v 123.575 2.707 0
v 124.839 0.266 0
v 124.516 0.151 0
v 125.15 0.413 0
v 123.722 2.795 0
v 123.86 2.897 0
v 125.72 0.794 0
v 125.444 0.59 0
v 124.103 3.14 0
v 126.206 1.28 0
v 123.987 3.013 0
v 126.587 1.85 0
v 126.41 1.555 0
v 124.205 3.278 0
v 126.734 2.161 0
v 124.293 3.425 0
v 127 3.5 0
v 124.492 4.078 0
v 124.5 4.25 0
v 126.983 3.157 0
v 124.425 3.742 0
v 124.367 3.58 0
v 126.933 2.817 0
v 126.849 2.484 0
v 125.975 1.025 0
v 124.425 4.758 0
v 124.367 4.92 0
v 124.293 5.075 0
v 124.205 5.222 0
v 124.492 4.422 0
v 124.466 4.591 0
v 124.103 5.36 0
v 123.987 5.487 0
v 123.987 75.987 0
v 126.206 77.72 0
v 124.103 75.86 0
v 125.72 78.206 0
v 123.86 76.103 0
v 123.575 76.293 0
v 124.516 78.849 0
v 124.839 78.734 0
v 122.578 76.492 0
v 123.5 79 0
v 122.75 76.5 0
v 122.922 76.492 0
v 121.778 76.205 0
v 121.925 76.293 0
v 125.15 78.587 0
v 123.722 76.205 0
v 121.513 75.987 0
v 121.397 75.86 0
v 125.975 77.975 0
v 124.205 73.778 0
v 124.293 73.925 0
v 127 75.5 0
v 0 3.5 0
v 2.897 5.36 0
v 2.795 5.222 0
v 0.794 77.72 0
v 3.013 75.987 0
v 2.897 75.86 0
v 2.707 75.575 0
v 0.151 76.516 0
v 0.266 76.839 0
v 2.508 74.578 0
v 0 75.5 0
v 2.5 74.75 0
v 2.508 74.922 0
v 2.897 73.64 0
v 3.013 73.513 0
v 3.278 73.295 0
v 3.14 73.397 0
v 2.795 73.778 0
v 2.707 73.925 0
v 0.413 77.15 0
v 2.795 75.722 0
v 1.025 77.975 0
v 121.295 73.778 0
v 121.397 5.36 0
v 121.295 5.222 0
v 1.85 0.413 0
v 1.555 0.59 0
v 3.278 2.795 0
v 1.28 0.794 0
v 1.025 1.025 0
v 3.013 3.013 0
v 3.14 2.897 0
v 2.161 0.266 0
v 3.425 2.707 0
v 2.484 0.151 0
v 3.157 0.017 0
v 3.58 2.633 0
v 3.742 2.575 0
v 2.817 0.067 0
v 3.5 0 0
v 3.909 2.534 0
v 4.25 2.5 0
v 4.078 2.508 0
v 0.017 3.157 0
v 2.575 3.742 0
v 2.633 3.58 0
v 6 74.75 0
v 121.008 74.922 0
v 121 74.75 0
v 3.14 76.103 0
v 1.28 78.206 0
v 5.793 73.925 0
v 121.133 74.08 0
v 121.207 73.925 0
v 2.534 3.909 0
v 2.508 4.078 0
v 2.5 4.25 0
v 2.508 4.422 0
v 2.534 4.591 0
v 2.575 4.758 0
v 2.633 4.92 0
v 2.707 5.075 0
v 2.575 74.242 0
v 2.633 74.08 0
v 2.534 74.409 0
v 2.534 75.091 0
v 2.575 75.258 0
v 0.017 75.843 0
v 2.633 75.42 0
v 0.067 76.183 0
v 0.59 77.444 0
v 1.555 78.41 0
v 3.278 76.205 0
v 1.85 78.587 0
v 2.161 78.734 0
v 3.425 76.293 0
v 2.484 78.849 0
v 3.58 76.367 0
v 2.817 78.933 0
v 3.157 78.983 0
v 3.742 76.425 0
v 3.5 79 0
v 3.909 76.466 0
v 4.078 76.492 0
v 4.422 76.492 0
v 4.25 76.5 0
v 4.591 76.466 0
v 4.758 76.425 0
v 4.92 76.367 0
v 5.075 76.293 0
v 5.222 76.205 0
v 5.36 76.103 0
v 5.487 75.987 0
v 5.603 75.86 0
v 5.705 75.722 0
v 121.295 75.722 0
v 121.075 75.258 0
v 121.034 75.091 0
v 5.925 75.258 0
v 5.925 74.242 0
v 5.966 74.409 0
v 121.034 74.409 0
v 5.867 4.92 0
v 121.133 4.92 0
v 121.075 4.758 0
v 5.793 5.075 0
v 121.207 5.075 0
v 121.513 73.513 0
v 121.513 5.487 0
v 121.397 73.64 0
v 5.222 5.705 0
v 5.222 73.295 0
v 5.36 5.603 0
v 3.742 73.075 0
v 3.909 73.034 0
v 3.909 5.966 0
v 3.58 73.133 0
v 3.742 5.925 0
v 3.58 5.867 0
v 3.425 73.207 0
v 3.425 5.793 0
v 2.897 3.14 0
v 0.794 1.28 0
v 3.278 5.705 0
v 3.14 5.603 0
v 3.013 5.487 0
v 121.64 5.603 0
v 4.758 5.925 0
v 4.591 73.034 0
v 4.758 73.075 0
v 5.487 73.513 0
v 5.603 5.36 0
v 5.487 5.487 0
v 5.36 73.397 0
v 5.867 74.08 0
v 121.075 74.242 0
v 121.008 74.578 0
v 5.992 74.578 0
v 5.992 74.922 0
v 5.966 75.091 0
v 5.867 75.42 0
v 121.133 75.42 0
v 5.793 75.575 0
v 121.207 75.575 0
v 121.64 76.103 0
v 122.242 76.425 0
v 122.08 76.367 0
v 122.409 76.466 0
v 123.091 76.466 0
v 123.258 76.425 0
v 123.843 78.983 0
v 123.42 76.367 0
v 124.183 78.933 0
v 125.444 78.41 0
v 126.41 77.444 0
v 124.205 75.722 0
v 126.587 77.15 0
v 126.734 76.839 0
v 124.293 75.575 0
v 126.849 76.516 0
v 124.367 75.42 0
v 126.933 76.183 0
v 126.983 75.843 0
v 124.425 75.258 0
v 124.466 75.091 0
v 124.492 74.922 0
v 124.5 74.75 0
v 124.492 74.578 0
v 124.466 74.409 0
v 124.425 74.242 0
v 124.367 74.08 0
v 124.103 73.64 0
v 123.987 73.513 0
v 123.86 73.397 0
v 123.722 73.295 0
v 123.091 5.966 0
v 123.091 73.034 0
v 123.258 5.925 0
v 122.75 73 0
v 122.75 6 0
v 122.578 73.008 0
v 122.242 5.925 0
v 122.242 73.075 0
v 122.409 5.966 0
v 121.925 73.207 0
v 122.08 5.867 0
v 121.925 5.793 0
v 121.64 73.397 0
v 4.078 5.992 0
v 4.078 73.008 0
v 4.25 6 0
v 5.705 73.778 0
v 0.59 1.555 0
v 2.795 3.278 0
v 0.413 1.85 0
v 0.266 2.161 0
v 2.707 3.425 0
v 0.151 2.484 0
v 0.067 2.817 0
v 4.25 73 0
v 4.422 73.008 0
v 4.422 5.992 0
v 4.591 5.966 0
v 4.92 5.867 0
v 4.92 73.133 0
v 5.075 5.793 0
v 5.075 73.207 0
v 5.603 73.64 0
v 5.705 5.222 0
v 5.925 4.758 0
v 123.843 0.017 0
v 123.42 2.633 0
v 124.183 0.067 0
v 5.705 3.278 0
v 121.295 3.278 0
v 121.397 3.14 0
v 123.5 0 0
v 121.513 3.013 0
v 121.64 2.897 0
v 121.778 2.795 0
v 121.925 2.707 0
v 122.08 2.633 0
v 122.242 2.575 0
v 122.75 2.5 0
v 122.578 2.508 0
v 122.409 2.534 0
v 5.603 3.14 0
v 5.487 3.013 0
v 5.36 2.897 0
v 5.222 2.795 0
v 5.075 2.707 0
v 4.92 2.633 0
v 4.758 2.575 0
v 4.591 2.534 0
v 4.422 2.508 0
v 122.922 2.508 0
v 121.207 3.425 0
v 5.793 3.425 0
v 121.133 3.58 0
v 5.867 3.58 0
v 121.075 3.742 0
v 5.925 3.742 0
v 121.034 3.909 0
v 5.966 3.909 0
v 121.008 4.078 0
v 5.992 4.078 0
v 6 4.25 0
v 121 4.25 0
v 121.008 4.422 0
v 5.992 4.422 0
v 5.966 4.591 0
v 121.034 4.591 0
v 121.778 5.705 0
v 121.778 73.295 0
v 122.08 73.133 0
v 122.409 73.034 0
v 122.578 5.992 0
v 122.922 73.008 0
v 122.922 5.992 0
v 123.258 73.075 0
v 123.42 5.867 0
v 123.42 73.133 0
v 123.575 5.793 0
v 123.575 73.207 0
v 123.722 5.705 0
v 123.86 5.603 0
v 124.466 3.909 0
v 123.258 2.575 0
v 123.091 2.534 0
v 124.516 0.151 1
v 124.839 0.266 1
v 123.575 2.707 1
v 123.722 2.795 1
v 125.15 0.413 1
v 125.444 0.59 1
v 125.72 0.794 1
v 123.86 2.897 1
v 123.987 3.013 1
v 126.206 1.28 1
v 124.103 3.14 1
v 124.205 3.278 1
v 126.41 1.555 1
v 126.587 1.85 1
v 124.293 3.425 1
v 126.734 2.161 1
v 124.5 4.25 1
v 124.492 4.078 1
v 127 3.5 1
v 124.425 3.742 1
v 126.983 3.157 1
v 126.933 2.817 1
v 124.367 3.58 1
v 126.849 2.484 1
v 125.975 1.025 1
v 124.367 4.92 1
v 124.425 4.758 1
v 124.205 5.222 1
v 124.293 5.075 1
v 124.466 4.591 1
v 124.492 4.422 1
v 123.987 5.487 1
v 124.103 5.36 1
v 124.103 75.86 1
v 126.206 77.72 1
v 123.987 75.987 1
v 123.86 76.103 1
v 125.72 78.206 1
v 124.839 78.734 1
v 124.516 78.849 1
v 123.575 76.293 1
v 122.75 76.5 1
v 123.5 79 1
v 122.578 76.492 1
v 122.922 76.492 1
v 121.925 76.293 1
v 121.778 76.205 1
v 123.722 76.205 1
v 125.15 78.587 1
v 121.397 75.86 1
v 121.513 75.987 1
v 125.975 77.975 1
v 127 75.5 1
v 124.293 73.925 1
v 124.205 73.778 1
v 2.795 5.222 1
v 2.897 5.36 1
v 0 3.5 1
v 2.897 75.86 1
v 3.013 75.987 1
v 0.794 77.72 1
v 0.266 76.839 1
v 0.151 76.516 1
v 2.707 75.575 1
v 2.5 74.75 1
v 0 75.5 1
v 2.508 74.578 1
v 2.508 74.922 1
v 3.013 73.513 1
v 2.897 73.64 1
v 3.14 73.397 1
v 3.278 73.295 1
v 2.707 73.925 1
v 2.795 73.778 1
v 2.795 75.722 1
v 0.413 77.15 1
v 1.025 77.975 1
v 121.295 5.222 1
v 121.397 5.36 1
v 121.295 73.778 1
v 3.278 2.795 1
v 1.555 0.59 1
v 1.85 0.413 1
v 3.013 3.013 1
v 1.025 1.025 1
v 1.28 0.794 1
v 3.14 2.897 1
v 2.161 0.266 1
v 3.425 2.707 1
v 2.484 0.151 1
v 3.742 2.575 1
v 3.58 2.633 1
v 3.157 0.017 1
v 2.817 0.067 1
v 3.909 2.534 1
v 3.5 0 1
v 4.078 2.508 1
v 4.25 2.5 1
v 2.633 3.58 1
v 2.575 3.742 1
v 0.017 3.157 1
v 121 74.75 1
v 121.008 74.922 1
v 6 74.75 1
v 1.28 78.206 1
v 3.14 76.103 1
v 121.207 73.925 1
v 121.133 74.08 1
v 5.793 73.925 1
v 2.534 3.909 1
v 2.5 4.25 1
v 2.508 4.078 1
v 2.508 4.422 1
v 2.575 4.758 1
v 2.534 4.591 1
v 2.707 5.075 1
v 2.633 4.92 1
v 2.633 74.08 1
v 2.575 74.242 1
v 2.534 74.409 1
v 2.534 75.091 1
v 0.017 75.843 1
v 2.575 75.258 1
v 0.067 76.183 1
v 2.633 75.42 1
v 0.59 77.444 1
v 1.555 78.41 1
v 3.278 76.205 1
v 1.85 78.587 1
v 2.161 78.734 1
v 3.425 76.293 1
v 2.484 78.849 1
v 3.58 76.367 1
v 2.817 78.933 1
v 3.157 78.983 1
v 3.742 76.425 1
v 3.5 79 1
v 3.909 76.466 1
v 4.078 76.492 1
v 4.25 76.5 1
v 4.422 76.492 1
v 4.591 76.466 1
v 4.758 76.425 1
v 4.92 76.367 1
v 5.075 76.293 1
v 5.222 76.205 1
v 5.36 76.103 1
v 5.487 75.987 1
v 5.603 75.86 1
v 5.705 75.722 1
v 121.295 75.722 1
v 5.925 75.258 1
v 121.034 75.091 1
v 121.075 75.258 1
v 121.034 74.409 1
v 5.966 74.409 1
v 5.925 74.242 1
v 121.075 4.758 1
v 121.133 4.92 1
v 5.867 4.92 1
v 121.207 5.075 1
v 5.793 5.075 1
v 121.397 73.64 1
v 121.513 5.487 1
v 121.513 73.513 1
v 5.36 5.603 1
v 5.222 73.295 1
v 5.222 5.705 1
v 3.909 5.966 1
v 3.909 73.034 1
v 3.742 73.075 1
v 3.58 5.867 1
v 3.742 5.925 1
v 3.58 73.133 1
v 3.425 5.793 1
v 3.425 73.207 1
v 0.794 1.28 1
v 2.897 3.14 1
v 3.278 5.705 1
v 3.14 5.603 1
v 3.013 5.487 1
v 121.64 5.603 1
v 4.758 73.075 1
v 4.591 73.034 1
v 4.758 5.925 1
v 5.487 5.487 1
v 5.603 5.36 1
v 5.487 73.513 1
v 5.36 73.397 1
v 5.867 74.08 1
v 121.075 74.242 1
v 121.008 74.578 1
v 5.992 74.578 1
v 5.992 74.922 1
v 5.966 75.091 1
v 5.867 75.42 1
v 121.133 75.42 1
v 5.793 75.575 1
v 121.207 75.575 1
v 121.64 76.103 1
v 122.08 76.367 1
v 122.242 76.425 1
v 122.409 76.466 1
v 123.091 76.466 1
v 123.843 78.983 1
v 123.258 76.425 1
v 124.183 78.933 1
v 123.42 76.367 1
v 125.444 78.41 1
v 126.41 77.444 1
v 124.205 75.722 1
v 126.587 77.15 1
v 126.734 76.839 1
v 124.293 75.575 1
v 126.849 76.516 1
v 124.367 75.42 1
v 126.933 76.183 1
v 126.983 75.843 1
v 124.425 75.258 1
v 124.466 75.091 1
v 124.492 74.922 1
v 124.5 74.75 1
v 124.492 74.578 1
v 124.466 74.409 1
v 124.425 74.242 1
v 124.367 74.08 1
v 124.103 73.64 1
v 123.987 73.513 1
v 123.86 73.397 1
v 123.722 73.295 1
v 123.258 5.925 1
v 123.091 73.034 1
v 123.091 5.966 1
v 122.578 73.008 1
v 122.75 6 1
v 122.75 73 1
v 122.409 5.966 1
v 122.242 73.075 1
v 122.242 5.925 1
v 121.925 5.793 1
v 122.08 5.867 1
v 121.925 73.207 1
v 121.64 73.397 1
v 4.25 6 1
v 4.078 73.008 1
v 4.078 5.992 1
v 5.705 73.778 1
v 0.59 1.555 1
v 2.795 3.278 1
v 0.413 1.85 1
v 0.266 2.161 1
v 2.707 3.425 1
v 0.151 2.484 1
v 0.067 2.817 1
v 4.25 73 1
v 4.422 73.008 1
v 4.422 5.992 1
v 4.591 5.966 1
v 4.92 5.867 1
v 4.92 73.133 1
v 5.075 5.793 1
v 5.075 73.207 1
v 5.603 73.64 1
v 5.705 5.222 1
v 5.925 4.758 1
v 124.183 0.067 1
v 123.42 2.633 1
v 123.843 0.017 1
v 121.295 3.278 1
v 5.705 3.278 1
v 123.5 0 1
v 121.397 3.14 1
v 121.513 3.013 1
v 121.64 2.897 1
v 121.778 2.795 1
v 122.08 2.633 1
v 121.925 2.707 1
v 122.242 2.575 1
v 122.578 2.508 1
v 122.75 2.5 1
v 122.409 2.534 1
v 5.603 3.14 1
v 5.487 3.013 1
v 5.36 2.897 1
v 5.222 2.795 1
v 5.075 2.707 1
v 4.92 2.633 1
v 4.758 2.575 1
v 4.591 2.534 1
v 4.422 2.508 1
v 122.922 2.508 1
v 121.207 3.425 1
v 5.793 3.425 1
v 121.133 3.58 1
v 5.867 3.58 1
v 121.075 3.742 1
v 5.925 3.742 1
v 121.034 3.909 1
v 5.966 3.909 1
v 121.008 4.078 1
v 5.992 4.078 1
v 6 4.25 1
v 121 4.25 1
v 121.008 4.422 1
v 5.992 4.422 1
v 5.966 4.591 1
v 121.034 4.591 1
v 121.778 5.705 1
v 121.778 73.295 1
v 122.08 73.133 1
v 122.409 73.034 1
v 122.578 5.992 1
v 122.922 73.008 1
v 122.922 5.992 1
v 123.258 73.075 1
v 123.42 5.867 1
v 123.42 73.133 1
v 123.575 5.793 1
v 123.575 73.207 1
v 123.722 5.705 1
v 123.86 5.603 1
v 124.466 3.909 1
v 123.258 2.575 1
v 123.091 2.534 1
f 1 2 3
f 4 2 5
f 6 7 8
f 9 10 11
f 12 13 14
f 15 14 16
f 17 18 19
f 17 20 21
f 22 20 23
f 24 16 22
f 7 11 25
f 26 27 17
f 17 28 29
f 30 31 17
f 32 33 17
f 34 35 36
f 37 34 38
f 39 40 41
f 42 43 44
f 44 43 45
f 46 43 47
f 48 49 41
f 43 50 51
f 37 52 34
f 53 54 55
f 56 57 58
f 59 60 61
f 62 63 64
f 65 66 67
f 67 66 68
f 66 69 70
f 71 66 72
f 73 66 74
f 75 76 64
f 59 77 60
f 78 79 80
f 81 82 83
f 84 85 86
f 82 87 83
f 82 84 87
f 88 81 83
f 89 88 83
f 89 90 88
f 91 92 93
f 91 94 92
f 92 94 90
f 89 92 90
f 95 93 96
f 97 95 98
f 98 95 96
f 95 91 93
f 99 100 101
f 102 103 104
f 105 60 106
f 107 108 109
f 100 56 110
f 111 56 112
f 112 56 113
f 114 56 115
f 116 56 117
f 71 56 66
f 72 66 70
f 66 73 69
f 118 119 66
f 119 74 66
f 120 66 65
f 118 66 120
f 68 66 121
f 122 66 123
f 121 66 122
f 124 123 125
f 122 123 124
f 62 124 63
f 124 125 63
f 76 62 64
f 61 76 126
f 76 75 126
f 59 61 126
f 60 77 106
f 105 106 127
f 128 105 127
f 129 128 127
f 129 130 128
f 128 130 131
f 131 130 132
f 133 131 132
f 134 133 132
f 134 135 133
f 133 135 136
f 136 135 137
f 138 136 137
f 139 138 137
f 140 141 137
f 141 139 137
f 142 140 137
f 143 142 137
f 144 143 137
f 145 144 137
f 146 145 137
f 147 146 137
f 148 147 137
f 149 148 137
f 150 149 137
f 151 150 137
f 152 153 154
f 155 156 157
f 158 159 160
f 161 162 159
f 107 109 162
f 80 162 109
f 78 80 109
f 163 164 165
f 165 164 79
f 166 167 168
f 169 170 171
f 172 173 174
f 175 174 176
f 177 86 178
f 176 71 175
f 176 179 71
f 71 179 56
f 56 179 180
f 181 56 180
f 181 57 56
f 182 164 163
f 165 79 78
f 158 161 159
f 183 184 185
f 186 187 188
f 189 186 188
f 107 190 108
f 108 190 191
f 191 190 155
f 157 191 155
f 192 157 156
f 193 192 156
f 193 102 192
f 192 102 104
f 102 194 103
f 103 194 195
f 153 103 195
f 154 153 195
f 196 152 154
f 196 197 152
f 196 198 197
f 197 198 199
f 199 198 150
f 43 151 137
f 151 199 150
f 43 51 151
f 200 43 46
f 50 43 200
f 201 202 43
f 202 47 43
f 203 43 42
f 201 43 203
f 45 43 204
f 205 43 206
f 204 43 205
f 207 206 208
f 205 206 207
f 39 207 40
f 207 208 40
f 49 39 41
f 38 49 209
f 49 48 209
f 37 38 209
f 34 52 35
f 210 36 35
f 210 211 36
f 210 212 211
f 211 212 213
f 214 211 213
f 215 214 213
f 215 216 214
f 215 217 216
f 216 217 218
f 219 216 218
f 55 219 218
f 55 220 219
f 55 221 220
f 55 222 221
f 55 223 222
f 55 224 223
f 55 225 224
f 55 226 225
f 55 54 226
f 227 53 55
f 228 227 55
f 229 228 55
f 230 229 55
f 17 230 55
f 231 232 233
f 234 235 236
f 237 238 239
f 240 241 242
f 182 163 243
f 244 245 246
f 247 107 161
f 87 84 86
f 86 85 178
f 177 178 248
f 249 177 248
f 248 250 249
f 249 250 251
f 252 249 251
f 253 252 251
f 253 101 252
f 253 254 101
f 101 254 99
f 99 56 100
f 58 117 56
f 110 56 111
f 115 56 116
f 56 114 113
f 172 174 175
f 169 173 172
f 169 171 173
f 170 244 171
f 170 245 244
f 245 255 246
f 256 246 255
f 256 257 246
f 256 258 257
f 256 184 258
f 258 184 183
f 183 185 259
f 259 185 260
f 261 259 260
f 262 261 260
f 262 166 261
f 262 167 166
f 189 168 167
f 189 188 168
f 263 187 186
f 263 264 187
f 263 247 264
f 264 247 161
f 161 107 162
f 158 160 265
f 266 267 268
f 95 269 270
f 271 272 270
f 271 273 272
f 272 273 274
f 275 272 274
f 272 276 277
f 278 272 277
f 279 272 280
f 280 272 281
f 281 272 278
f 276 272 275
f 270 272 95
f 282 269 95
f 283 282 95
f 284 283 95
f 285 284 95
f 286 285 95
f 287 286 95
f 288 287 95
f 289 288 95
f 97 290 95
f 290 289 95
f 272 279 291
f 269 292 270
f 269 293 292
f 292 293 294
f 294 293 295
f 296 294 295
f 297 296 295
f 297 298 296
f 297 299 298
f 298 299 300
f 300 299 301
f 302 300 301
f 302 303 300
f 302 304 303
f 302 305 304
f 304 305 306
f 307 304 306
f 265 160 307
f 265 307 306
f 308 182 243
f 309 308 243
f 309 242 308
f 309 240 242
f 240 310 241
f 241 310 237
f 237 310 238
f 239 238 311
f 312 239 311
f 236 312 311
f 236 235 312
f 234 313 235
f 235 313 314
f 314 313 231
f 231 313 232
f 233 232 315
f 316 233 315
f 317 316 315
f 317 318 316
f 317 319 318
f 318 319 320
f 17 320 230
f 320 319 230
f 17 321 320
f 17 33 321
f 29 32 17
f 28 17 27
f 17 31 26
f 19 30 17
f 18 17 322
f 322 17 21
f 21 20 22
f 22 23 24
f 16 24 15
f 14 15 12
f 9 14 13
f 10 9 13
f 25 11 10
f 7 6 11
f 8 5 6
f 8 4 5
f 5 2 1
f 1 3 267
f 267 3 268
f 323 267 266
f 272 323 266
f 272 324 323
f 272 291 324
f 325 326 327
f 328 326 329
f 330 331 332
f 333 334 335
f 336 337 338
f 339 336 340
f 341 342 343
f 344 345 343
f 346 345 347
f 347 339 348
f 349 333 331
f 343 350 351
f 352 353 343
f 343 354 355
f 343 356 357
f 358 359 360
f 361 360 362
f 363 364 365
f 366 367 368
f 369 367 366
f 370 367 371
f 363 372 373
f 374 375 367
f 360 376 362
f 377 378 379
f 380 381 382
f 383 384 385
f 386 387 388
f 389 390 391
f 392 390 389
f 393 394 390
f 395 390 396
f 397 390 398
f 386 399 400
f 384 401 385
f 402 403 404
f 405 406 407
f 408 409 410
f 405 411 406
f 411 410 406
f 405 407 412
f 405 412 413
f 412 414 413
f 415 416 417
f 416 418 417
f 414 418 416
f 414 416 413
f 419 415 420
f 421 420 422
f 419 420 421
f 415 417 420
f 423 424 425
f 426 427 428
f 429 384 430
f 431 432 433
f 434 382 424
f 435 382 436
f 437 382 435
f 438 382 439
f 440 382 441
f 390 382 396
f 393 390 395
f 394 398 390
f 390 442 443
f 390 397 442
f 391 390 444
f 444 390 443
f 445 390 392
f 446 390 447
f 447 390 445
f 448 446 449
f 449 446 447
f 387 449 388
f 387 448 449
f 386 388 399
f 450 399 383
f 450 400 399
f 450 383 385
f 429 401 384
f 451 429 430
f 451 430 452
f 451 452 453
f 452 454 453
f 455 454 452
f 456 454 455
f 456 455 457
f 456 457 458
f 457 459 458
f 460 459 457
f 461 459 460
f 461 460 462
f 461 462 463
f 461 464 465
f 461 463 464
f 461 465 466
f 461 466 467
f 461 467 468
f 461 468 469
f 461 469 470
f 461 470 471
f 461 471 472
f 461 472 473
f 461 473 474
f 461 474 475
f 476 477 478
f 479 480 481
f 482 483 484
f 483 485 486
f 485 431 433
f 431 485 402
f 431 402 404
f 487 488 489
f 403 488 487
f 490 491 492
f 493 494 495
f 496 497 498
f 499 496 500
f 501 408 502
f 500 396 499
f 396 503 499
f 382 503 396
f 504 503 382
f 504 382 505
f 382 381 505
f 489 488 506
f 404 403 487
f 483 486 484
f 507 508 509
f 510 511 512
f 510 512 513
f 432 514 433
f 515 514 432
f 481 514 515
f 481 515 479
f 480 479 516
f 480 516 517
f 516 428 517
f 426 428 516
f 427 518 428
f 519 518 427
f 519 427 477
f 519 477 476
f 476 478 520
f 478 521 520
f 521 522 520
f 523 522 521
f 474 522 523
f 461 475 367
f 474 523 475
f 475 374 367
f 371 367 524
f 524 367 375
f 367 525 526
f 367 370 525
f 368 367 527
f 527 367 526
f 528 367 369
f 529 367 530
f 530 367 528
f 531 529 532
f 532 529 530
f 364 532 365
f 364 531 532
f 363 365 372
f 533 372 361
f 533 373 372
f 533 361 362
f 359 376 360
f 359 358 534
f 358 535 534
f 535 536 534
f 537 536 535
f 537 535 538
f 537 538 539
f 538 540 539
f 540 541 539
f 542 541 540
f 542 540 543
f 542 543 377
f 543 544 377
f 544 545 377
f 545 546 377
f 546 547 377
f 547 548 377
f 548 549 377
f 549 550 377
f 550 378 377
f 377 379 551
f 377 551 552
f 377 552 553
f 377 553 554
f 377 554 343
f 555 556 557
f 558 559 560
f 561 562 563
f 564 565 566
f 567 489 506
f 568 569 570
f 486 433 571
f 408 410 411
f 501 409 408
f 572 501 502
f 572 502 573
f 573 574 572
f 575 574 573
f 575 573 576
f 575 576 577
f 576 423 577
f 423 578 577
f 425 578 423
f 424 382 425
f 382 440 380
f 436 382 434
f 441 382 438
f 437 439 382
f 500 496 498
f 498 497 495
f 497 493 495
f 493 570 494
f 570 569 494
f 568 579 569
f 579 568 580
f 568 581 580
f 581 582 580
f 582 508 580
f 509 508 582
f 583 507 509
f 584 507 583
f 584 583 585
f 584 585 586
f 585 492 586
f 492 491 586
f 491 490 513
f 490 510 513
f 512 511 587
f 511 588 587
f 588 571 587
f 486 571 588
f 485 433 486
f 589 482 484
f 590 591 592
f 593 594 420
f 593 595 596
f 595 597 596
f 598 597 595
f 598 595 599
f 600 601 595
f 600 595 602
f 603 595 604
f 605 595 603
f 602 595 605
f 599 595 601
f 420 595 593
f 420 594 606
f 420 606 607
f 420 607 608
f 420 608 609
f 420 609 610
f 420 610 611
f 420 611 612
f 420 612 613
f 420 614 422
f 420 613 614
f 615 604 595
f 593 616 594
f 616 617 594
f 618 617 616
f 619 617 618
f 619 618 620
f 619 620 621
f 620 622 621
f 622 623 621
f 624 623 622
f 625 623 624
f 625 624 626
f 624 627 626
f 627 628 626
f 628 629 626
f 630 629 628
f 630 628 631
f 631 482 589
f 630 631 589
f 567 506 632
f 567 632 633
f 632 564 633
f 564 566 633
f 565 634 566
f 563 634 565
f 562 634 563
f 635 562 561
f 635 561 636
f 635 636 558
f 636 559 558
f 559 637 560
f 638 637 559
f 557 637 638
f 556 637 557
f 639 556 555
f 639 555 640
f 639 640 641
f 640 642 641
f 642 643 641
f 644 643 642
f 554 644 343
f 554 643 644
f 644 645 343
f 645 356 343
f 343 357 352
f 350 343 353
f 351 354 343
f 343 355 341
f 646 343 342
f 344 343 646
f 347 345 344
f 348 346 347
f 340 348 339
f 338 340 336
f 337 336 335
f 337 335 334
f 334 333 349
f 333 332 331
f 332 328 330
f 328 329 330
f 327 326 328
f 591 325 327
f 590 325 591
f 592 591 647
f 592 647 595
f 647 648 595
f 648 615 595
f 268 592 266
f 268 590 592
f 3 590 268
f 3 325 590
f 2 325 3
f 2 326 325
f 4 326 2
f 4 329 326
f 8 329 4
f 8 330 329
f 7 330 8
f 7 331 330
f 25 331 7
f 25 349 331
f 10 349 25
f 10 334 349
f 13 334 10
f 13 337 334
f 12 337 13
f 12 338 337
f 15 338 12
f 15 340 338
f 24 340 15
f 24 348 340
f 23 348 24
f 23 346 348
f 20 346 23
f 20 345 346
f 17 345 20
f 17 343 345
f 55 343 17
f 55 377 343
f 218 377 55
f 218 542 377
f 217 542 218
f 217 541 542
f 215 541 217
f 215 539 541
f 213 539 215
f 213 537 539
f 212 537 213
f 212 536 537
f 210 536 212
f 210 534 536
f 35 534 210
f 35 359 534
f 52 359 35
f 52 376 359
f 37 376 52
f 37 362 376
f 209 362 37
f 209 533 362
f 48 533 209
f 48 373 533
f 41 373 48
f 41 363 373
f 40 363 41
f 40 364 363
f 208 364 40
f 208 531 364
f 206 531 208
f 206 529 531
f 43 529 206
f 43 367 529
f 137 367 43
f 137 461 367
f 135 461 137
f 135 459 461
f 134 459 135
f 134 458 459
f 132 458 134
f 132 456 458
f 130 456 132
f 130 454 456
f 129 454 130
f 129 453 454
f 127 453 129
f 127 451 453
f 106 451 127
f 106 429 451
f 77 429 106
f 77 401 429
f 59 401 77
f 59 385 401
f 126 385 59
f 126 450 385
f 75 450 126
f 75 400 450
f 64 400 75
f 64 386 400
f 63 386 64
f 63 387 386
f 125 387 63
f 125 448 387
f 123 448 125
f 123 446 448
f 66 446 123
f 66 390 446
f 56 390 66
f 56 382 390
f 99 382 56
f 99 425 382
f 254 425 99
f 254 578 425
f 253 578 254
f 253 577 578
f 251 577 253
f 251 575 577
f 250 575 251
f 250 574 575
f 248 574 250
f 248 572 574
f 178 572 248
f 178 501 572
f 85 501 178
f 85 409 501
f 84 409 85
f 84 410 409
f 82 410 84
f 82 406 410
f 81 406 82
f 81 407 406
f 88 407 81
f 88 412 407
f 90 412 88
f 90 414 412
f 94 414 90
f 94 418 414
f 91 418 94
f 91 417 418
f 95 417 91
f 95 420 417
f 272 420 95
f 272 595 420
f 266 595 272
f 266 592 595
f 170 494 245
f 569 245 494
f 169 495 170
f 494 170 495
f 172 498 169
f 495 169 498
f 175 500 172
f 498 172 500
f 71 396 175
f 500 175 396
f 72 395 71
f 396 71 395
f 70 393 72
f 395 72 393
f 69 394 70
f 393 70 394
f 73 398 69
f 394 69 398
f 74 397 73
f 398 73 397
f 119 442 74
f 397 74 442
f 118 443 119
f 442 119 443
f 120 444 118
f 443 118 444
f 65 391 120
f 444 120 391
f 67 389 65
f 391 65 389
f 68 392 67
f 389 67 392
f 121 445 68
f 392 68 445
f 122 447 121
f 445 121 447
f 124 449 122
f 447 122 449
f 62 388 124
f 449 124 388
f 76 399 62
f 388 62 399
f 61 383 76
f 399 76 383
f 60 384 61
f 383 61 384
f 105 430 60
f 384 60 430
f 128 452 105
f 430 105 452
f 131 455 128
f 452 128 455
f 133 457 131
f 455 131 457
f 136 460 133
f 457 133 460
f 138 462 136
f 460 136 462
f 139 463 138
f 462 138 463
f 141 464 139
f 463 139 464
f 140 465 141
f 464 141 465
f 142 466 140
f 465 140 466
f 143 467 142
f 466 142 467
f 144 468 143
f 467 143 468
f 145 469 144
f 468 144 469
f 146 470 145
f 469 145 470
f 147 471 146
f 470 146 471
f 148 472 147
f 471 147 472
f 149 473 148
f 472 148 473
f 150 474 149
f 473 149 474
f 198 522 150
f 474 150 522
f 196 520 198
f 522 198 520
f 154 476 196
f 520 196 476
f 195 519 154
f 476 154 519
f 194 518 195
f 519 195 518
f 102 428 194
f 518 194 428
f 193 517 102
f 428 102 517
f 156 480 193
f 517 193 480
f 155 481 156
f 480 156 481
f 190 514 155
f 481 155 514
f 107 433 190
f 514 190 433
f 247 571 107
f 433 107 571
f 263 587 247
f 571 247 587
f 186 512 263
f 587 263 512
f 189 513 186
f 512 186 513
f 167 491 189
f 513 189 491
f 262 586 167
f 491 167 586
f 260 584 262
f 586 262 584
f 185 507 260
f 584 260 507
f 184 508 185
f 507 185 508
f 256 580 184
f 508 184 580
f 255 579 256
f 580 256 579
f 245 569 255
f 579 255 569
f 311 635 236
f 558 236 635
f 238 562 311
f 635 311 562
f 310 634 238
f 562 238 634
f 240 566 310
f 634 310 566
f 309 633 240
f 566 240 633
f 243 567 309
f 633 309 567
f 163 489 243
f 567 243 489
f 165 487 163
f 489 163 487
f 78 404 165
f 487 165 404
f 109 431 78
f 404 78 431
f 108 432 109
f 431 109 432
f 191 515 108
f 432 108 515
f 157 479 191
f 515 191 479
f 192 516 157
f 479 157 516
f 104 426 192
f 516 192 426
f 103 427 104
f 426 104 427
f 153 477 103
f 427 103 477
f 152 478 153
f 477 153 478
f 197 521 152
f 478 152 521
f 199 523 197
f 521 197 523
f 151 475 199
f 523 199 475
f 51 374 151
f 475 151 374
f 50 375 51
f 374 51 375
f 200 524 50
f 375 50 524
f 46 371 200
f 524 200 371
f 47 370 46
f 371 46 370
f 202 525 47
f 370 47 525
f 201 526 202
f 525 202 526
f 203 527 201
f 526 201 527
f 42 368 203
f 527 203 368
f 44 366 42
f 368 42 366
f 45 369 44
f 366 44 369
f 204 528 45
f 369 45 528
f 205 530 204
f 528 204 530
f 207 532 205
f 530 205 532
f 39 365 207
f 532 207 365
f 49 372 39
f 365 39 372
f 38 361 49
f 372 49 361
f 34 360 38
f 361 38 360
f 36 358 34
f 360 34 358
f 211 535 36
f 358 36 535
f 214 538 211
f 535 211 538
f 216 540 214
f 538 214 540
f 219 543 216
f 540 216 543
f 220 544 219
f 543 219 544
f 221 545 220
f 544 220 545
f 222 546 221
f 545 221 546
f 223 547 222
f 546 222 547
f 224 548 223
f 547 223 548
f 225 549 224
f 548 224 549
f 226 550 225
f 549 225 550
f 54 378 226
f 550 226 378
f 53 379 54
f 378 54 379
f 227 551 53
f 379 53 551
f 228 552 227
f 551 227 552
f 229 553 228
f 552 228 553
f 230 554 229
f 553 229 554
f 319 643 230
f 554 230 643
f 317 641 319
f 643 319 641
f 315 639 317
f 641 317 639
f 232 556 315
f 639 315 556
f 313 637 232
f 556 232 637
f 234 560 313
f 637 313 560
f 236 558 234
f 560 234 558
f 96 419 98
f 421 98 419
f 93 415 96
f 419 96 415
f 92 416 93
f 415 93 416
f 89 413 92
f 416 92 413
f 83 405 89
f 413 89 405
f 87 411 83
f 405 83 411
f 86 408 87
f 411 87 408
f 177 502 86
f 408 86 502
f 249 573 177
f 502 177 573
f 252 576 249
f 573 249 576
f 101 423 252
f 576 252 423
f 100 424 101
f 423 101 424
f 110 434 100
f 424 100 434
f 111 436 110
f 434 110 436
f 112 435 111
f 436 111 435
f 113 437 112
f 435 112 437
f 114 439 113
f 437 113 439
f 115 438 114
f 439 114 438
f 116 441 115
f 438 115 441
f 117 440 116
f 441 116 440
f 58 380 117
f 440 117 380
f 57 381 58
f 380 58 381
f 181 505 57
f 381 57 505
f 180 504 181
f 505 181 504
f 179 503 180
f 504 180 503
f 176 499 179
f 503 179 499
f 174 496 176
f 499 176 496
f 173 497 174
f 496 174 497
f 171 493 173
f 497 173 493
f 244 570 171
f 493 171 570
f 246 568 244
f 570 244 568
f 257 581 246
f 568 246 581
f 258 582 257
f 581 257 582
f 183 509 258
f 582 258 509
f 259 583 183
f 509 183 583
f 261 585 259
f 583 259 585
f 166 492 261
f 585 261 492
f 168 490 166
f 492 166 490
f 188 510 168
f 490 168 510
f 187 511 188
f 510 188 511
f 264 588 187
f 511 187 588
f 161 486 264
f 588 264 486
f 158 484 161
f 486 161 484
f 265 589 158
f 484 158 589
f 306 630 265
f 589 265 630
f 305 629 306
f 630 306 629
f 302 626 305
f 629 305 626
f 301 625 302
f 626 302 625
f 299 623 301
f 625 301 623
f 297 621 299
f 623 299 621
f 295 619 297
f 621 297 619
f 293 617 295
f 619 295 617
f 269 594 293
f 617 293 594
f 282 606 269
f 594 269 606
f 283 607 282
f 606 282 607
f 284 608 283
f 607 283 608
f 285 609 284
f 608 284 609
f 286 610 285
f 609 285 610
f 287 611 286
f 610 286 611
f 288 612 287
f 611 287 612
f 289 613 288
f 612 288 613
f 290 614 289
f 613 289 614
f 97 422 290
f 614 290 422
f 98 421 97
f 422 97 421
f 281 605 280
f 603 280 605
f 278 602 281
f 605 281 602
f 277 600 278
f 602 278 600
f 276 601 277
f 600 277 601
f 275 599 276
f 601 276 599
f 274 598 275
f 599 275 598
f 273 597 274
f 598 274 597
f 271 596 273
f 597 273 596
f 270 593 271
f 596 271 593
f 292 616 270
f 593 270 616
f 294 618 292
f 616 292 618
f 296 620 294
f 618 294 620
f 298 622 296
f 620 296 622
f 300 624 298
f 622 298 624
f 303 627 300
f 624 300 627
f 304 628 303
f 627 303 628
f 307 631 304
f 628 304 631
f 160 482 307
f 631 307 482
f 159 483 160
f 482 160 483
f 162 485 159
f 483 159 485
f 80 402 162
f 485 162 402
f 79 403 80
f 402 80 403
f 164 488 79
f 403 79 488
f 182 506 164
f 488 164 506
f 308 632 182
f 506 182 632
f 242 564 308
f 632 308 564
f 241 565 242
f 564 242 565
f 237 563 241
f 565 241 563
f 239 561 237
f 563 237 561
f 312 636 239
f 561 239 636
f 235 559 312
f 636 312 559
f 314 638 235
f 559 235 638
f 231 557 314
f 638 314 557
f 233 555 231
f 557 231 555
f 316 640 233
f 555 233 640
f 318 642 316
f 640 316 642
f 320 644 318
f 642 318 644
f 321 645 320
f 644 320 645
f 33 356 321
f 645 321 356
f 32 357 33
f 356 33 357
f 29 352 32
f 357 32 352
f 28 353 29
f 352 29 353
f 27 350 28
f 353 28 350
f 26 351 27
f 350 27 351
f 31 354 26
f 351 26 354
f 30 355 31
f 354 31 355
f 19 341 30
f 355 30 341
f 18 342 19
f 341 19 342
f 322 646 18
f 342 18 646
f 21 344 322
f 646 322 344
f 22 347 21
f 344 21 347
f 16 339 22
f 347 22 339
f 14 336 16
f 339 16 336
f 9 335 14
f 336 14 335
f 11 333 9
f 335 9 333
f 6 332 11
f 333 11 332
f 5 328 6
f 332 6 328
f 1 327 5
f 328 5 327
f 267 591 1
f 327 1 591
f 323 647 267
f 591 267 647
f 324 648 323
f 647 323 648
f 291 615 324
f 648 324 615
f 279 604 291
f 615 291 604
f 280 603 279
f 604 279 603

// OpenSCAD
$fn = 64;

PINE_64_SIZE = [127, 79];
PINE_64_SCREW_RADIUS = 3.5 / 2;
PINE_64_SCREW_OFFSET = 2.5 + PINE_64_SCREW_RADIUS;
PINE_64_PCB_THICKNESS = 1;

// TODO: Consider replacing this with RoundedRect2D from github.com:PhilboBaggins/openscad-common.git
module RoundedCornerBox_2D(size, cornerRadius)
{
    x1 =           cornerRadius;
    x2 = size[0] - cornerRadius;
    y1 =           cornerRadius;
    y2 = size[1] - cornerRadius;

    hull()
    {
        translate([x1, y1]) circle(r=cornerRadius);
        translate([x2, y1]) circle(r=cornerRadius);
        translate([x1, y2]) circle(r=cornerRadius);
        translate([x2, y2]) circle(r=cornerRadius);
    }
}

module RoundedCornerBox_3D(size, cornerRadius, thickness)
{
    linear_extrude(thickness)
    RoundedCornerBox_2D(size, cornerRadius);
}

module Pine64_2D()
{
    screwX1 = PINE_64_SIZE[0] * 0 + PINE_64_SCREW_OFFSET;
    screwX2 = PINE_64_SIZE[0] * 1 - PINE_64_SCREW_OFFSET;
    screwY1 = PINE_64_SIZE[1] * 0 + PINE_64_SCREW_OFFSET;
    screwY2 = PINE_64_SIZE[1] * 1 - PINE_64_SCREW_OFFSET;

    difference()
    {
        RoundedCornerBox_2D(PINE_64_SIZE, PINE_64_SCREW_RADIUS * 2);

        translate([screwX1, screwY1]) circle(r=PINE_64_SCREW_RADIUS);
        translate([screwX2, screwY1]) circle(r=PINE_64_SCREW_RADIUS);
        translate([screwX1, screwY2]) circle(r=PINE_64_SCREW_RADIUS);
        translate([screwX2, screwY2]) circle(r=PINE_64_SCREW_RADIUS);
    }
}

module Pine64_3D()
{
    linear_extrude(PINE_64_PCB_THICKNESS)
    Pine64_2D();
}

Pine64_3D();
